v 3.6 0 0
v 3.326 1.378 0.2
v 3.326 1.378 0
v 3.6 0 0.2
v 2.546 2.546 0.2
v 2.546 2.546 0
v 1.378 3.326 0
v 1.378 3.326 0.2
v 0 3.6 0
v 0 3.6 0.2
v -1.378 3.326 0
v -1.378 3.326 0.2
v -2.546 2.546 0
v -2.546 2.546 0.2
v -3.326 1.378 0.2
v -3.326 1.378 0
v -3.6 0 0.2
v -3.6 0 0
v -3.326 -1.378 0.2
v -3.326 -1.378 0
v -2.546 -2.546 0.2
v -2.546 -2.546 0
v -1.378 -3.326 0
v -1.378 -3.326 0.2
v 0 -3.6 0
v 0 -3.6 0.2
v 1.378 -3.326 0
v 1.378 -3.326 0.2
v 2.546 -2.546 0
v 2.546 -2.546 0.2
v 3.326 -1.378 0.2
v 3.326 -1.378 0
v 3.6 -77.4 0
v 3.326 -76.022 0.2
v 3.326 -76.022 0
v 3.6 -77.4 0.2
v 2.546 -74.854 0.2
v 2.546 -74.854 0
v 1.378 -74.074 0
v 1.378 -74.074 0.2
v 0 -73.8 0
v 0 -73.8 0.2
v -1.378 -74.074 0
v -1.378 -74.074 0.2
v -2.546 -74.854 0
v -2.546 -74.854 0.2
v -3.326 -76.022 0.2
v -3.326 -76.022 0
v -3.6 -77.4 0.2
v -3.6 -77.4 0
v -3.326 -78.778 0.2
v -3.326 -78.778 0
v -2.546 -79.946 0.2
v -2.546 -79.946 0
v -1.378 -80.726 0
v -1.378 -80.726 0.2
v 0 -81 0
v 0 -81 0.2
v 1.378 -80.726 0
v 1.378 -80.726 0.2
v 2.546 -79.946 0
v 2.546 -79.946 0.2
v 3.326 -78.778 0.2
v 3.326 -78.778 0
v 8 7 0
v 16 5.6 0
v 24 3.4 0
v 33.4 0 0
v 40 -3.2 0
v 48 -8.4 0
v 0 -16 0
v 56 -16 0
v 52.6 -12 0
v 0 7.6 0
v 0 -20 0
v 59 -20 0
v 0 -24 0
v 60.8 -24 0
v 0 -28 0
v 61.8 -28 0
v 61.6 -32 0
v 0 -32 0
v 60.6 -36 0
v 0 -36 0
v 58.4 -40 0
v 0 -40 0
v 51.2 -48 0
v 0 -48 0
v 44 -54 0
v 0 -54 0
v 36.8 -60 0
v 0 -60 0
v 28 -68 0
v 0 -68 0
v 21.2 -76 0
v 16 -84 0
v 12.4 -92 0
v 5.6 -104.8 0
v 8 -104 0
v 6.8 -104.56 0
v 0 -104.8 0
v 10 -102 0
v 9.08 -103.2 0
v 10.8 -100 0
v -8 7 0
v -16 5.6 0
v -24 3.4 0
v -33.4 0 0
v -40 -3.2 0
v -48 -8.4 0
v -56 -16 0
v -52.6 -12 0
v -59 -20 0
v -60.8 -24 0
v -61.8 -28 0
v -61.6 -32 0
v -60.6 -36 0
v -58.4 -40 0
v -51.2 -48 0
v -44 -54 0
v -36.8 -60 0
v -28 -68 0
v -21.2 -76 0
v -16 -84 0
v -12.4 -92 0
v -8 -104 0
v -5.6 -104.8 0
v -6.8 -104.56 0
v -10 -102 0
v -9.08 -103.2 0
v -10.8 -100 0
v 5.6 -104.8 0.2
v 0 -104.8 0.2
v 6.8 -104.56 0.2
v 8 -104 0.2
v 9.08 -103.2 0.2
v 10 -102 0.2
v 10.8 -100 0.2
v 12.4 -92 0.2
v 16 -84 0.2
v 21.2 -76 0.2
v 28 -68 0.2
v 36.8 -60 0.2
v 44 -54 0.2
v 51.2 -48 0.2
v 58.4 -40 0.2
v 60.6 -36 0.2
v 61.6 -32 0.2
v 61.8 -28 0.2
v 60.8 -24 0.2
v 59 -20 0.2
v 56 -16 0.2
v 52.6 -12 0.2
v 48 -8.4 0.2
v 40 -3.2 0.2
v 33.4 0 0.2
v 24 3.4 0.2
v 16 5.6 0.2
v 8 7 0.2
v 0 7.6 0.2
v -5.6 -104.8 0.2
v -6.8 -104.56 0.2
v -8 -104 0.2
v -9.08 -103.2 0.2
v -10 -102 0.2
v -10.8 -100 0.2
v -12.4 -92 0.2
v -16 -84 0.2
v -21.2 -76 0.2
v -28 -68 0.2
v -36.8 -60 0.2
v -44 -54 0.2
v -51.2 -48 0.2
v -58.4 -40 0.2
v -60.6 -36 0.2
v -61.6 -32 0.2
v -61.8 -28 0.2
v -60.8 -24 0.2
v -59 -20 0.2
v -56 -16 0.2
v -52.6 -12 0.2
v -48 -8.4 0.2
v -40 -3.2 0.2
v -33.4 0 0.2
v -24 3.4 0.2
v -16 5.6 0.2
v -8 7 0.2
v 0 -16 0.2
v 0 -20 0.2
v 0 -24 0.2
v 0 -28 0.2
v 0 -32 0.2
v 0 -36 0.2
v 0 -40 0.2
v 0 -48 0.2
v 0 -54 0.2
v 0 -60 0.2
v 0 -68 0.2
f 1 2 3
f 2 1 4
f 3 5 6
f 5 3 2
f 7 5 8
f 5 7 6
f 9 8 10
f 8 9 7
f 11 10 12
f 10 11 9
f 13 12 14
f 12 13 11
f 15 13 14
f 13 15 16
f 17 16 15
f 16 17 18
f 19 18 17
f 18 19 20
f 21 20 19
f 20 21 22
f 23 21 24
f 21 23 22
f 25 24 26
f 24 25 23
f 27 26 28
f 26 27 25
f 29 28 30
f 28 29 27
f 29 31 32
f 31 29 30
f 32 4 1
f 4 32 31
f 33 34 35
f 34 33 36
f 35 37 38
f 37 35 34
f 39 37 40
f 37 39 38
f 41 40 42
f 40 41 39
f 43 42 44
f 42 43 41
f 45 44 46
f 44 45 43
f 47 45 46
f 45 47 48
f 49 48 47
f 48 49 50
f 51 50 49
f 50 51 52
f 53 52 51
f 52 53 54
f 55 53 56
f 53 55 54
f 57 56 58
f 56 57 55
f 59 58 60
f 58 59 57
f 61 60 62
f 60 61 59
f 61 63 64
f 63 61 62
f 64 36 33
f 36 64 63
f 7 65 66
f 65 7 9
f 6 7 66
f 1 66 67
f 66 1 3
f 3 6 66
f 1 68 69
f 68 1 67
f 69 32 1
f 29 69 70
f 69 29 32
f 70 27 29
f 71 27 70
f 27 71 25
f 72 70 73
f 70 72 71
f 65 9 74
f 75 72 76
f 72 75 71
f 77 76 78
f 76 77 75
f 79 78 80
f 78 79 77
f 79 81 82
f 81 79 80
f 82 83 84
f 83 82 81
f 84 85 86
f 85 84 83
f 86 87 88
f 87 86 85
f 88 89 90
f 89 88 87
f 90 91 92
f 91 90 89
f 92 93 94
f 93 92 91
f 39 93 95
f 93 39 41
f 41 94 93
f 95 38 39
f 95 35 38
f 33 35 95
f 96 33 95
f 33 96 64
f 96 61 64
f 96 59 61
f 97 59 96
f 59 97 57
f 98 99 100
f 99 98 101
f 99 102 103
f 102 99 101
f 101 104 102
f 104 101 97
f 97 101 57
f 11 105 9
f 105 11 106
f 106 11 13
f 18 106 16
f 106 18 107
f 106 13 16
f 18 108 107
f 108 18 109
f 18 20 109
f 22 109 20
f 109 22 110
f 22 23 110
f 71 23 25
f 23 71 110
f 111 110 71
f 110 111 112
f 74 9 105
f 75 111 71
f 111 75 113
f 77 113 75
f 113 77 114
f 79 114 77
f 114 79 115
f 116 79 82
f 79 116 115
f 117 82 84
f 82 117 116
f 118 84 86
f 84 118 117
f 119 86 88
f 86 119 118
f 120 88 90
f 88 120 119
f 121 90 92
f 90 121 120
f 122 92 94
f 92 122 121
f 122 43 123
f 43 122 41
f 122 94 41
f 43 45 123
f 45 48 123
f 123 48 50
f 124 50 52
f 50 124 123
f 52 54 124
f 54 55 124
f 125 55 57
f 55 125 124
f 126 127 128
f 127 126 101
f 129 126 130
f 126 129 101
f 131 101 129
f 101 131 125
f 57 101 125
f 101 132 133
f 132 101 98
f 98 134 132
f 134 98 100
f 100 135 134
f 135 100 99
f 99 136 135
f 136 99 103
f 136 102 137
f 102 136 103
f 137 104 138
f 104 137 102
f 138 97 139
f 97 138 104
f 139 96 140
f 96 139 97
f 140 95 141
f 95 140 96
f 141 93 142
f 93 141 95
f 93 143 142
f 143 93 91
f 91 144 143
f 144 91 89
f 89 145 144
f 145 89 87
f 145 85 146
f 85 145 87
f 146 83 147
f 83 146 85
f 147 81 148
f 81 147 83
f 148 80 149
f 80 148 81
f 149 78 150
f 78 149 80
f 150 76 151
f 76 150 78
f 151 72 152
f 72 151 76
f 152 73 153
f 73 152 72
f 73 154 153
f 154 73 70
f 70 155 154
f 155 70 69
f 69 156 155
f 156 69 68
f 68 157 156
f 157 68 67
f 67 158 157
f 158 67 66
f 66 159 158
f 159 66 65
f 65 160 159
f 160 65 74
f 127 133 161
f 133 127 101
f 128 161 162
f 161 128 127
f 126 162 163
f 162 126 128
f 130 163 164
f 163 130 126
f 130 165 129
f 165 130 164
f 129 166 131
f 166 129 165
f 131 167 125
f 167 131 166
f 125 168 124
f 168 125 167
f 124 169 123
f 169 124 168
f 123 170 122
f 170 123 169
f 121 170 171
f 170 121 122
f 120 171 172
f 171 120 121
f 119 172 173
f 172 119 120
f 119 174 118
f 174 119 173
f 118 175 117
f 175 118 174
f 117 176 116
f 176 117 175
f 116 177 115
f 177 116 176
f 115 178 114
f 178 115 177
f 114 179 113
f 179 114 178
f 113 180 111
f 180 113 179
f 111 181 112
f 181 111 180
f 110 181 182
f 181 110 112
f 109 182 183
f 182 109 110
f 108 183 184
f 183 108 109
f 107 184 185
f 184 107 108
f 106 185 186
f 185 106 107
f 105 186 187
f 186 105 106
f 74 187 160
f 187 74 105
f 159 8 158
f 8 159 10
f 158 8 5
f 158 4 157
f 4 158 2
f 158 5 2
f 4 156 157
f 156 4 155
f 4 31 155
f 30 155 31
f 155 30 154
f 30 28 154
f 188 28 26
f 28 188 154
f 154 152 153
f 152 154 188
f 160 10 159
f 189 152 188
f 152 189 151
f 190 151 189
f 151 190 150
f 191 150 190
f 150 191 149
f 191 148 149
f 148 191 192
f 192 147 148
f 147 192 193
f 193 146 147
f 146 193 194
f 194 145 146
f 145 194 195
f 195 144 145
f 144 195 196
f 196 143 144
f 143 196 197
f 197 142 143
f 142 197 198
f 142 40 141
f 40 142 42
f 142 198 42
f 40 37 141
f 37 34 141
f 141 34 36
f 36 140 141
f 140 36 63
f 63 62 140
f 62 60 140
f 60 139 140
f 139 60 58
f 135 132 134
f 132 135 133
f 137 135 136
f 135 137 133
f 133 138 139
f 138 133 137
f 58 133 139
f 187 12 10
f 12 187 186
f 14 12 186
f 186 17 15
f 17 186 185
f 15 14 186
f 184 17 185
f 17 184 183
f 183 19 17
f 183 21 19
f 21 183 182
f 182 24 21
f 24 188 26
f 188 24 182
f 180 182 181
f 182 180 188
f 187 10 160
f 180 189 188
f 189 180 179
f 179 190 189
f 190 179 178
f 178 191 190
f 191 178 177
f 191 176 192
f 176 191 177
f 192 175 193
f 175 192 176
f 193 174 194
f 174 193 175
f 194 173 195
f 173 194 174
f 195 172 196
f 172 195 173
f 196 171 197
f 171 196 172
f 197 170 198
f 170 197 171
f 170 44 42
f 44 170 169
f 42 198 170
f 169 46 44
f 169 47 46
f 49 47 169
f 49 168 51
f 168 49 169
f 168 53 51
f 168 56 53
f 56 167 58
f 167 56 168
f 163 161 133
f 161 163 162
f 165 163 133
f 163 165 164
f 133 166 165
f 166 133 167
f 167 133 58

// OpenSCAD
// file: ../p/2-4edge.scad
use <../lib.scad>
function ldraw_lib__2_4edge() = [
// 0 Circle 0.5
// 0 Name: 2-4edge.dat
// 0 Author: James Jessiman
// 0 !LDRAW_ORG Primitive UPDATE 2017-01
// 0 !LICENSE Licensed under CC BY 2.0 and CC BY 4.0 : see CAreadme.txt
// 
// 0 BFC CERTIFY CCW
  [0,"BFC","CERTIFY"],
  [0,"BFC","CCW"],
// 
// 0 !HISTORY 2007-06-24 [PTadmin] Header formatted for Contributor Agreement
// 0 !HISTORY 2008-07-01 [PTadmin] Official Update 2008-01
// 0 !HISTORY 2017-01-15 [Steffen] BFCed
// 0 !HISTORY 2017-12-30 [PTadmin] Official Update 2017-01
// 
// 
// 2 24 1 0 0 0.9239 0 0.3827
  [2,24,1,0,0,0.9239,0,0.3827],
// 2 24 0.9239 0 0.3827 0.7071 0 0.7071
  [2,24,0.9239,0,0.3827,0.7071,0,0.7071],
// 2 24 0.7071 0 0.7071 0.3827 0 0.9239
  [2,24,0.7071,0,0.7071,0.3827,0,0.9239],
// 2 24 0.3827 0 0.9239 0 0 1
  [2,24,0.3827,0,0.9239,0,0,1],
// 2 24 0 0 1 -0.3827 0 0.9239
  [2,24,0,0,1,-0.3827,0,0.9239],
// 2 24 -0.3827 0 0.9239 -0.7071 0 0.7071
  [2,24,-0.3827,0,0.9239,-0.7071,0,0.7071],
// 2 24 -0.7071 0 0.7071 -0.9239 0 0.3827
  [2,24,-0.7071,0,0.7071,-0.9239,0,0.3827],
// 2 24 -0.9239 0 0.3827 -1 0 0
  [2,24,-0.9239,0,0.3827,-1,0,0],
];
module ldraw_lib__2_4edge(step=0, col=false, unit=2/5, alt=false, line=0.2, solid=!$preview)
    makepoly(ldraw_lib__2_4edge(), step=step, col=col, unit=unit, alt=alt, line=line, solid=solid);
ldraw_lib__2_4edge(line=0.2);
// file: s/93668s02.scad
use <../../lib.scad>
function ldraw_lib__s__93668s02() = [
// 0 ~Sheet Plastic 15 x 14 Curved - Half Edge
// 0 Name: s\93668s02.dat
// 0 Author: Christian Neumann [Wesley]
// 0 !LDRAW_ORG Subpart UPDATE 2018-02
// 0 !LICENSE Licensed under CC BY 2.0 and CC BY 4.0 : see CAreadme.txt
// 
// 0 BFC CERTIFY CCW
  [0,"BFC","CERTIFY"],
  [0,"BFC","CCW"],
// 
// 0 !HISTORY 2018-12-08 [PTadmin] Official Update 2018-02
// 
// 
// 4 16 0 0 -262 14 0 -262 14 -0.5 -262 0 -0.5 -262
  [4,16,0,0,-262,14,0,-262,14,-0.5,-262,0,-0.5,-262],
// 4 16 14 0 -262 17 0 -261.4 17 -0.5 -261.4 14 -0.5 -262
  [4,16,14,0,-262,17,0,-261.4,17,-0.5,-261.4,14,-0.5,-262],
// 4 16 17 0 -261.4 20 0 -260 20 -0.5 -260 17 -0.5 -261.4
  [4,16,17,0,-261.4,20,0,-260,20,-0.5,-260,17,-0.5,-261.4],
// 4 16 20 0 -260 22.7 0 -258 22.7 -0.5 -258 20 -0.5 -260
  [4,16,20,0,-260,22.7,0,-258,22.7,-0.5,-258,20,-0.5,-260],
// 4 16 22.7 0 -258 25 0 -255 25 -0.5 -255 22.7 -0.5 -258
  [4,16,22.7,0,-258,25,0,-255,25,-0.5,-255,22.7,-0.5,-258],
// 4 16 25 0 -255 27 0 -250 27 -0.5 -250 25 -0.5 -255
  [4,16,25,0,-255,27,0,-250,27,-0.5,-250,25,-0.5,-255],
// 4 16 27 0 -250 31 0 -230 31 -0.5 -230 27 -0.5 -250
  [4,16,27,0,-250,31,0,-230,31,-0.5,-230,27,-0.5,-250],
// 4 16 31 0 -230 40 0 -210 40 -0.5 -210 31 -0.5 -230
  [4,16,31,0,-230,40,0,-210,40,-0.5,-210,31,-0.5,-230],
// 4 16 40 0 -210 53 0 -190 53 -0.5 -190 40 -0.5 -210
  [4,16,40,0,-210,53,0,-190,53,-0.5,-190,40,-0.5,-210],
// 4 16 53 0 -190 70 0 -170 70 -0.5 -170 53 -0.5 -190
  [4,16,53,0,-190,70,0,-170,70,-0.5,-170,53,-0.5,-190],
// 4 16 70 0 -170 92 0 -150 92 -0.5 -150 70 -0.5 -170
  [4,16,70,0,-170,92,0,-150,92,-0.5,-150,70,-0.5,-170],
// 4 16 92 0 -150 110 0 -135 110 -0.5 -135 92 -0.5 -150
  [4,16,92,0,-150,110,0,-135,110,-0.5,-135,92,-0.5,-150],
// 4 16 110 0 -135 128 0 -120 128 -0.5 -120 110 -0.5 -135
  [4,16,110,0,-135,128,0,-120,128,-0.5,-120,110,-0.5,-135],
// 4 16 128 0 -120 146 0 -100 146 -0.5 -100 128 -0.5 -120
  [4,16,128,0,-120,146,0,-100,146,-0.5,-100,128,-0.5,-120],
// 4 16 146 0 -100 151.5 0 -90 151.5 -0.5 -90 146 -0.5 -100
  [4,16,146,0,-100,151.5,0,-90,151.5,-0.5,-90,146,-0.5,-100],
// 4 16 151.5 0 -90 154 0 -80 154 -0.5 -80 151.5 -0.5 -90
  [4,16,151.5,0,-90,154,0,-80,154,-0.5,-80,151.5,-0.5,-90],
// 4 16 154 0 -80 154.5 0 -70 154.5 -0.5 -70 154 -0.5 -80
  [4,16,154,0,-80,154.5,0,-70,154.5,-0.5,-70,154,-0.5,-80],
// 4 16 154.5 0 -70 152 0 -60 152 -0.5 -60 154.5 -0.5 -70
  [4,16,154.5,0,-70,152,0,-60,152,-0.5,-60,154.5,-0.5,-70],
// 4 16 152 0 -60 147.5 0 -50 147.5 -0.5 -50 152 -0.5 -60
  [4,16,152,0,-60,147.5,0,-50,147.5,-0.5,-50,152,-0.5,-60],
// 4 16 147.5 0 -50 140 0 -40 140 -0.5 -40 147.5 -0.5 -50
  [4,16,147.5,0,-50,140,0,-40,140,-0.5,-40,147.5,-0.5,-50],
// 4 16 140 0 -40 131.5 0 -30 131.5 -0.5 -30 140 -0.5 -40
  [4,16,140,0,-40,131.5,0,-30,131.5,-0.5,-30,140,-0.5,-40],
// 4 16 131.5 0 -30 120 0 -21 120 -0.5 -21 131.5 -0.5 -30
  [4,16,131.5,0,-30,120,0,-21,120,-0.5,-21,131.5,-0.5,-30],
// 4 16 120 0 -21 100 0 -8 100 -0.5 -8 120 -0.5 -21
  [4,16,120,0,-21,100,0,-8,100,-0.5,-8,120,-0.5,-21],
// 4 16 100 0 -8 83.5 0 0 83.5 -0.5 0 100 -0.5 -8
  [4,16,100,0,-8,83.5,0,0,83.5,-0.5,0,100,-0.5,-8],
// 4 16 83.5 0 0 60 0 8.5 60 -0.5 8.5 83.5 -0.5 0
  [4,16,83.5,0,0,60,0,8.5,60,-0.5,8.5,83.5,-0.5,0],
// 4 16 60 0 8.5 40 0 14 40 -0.5 14 60 -0.5 8.5
  [4,16,60,0,8.5,40,0,14,40,-0.5,14,60,-0.5,8.5],
// 4 16 40 0 14 20 0 17.5 20 -0.5 17.5 40 -0.5 14
  [4,16,40,0,14,20,0,17.5,20,-0.5,17.5,40,-0.5,14],
// 4 16 20 0 17.5 0 0 19 0 -0.5 19 20 -0.5 17.5
  [4,16,20,0,17.5,0,0,19,0,-0.5,19,20,-0.5,17.5],
// 5 24 14 0 -262 14 -0.5 -262 17 0 -261.4 0 0 -262
  [5,24,14,0,-262,14,-0.5,-262,17,0,-261.4,0,0,-262],
// 5 24 17 0 -261.4 17 -0.5 -261.4 20 0 -260 14 0 -262
  [5,24,17,0,-261.4,17,-0.5,-261.4,20,0,-260,14,0,-262],
// 5 24 20 0 -260 20 -0.5 -260 22.7 0 -258 17 0 -261.4
  [5,24,20,0,-260,20,-0.5,-260,22.7,0,-258,17,0,-261.4],
// 5 24 22.7 0 -258 22.7 -0.5 -258 25 0 -255 20 0 -260
  [5,24,22.7,0,-258,22.7,-0.5,-258,25,0,-255,20,0,-260],
// 5 24 25 0 -255 25 -0.5 -255 27 0 -250 22.7 0 -258
  [5,24,25,0,-255,25,-0.5,-255,27,0,-250,22.7,0,-258],
// 5 24 27 0 -250 27 -0.5 -250 31 0 -230 25 0 -255
  [5,24,27,0,-250,27,-0.5,-250,31,0,-230,25,0,-255],
// 5 24 31 0 -230 31 -0.5 -230 40 0 -210 27 0 -250
  [5,24,31,0,-230,31,-0.5,-230,40,0,-210,27,0,-250],
// 5 24 40 0 -210 40 -0.5 -210 53 0 -190 31 0 -230
  [5,24,40,0,-210,40,-0.5,-210,53,0,-190,31,0,-230],
// 5 24 53 0 -190 53 -0.5 -190 70 0 -170 40 0 -210
  [5,24,53,0,-190,53,-0.5,-190,70,0,-170,40,0,-210],
// 5 24 70 0 -170 70 -0.5 -170 92 0 -150 53 0 -190
  [5,24,70,0,-170,70,-0.5,-170,92,0,-150,53,0,-190],
// 5 24 92 0 -150 92 -0.5 -150 110 0 -135 70 0 -170
  [5,24,92,0,-150,92,-0.5,-150,110,0,-135,70,0,-170],
// 5 24 110 0 -135 110 -0.5 -135 128 0 -120 92 0 -150
  [5,24,110,0,-135,110,-0.5,-135,128,0,-120,92,0,-150],
// 5 24 128 0 -120 128 -0.5 -120 146 0 -100 110 0 -135
  [5,24,128,0,-120,128,-0.5,-120,146,0,-100,110,0,-135],
// 5 24 146 0 -100 146 -0.5 -100 151.5 0 -90 128 0 -120
  [5,24,146,0,-100,146,-0.5,-100,151.5,0,-90,128,0,-120],
// 5 24 151.5 0 -90 151.5 -0.5 -90 154 0 -80 146 0 -100
  [5,24,151.5,0,-90,151.5,-0.5,-90,154,0,-80,146,0,-100],
// 5 24 154 0 -80 154 -0.5 -80 154.5 0 -70 151.5 0 -90
  [5,24,154,0,-80,154,-0.5,-80,154.5,0,-70,151.5,0,-90],
// 5 24 154.5 0 -70 154.5 -0.5 -70 152 0 -60 154 0 -80
  [5,24,154.5,0,-70,154.5,-0.5,-70,152,0,-60,154,0,-80],
// 5 24 152 0 -60 152 -0.5 -60 147.5 0 -50 154.5 0 -70
  [5,24,152,0,-60,152,-0.5,-60,147.5,0,-50,154.5,0,-70],
// 5 24 147.5 0 -50 147.5 -0.5 -50 140 0 -40 152 0 -60
  [5,24,147.5,0,-50,147.5,-0.5,-50,140,0,-40,152,0,-60],
// 5 24 140 0 -40 140 -0.5 -40 131.5 0 -30 147.5 0 -50
  [5,24,140,0,-40,140,-0.5,-40,131.5,0,-30,147.5,0,-50],
// 5 24 131.5 0 -30 131.5 -0.5 -30 120 0 -21 140 0 -40
  [5,24,131.5,0,-30,131.5,-0.5,-30,120,0,-21,140,0,-40],
// 5 24 120 0 -21 120 -0.5 -21 100 0 -8 131.5 0 -30
  [5,24,120,0,-21,120,-0.5,-21,100,0,-8,131.5,0,-30],
// 5 24 100 0 -8 100 -0.5 -8 83.5 0 0 120 0 -21
  [5,24,100,0,-8,100,-0.5,-8,83.5,0,0,120,0,-21],
// 5 24 83.5 0 0 83.5 -0.5 0 60 0 8.5 100 0 -8
  [5,24,83.5,0,0,83.5,-0.5,0,60,0,8.5,100,0,-8],
// 5 24 60 0 8.5 60 -0.5 8.5 40 0 14 83.5 0 0
  [5,24,60,0,8.5,60,-0.5,8.5,40,0,14,83.5,0,0],
// 5 24 40 0 14 40 -0.5 14 20 0 17.5 60 0 8.5
  [5,24,40,0,14,40,-0.5,14,20,0,17.5,60,0,8.5],
// 5 24 20 0 17.5 20 -0.5 17.5 0 0 19 40 0 14
  [5,24,20,0,17.5,20,-0.5,17.5,0,0,19,40,0,14],
];
module ldraw_lib__s__93668s02(step=0, col=false, unit=2/5, alt=false, line=0.2, solid=!$preview)
    makepoly(ldraw_lib__s__93668s02(), step=step, col=col, unit=unit, alt=alt, line=line, solid=solid);
ldraw_lib__s__93668s02(line=0.2);
// file: s/93668s01.scad
use <../../lib.scad>
use <../../p/2-4edge.scad>
function ldraw_lib__s__93668s01() = [
// 0 ~Sheet Plastic 15 x 14 Curved - Half Surface
// 0 Name: s\93668s01.dat
// 0 Author: Christian Neumann [Wesley]
// 0 !LDRAW_ORG Subpart UPDATE 2018-02
// 0 !LICENSE Licensed under CC BY 2.0 and CC BY 4.0 : see CAreadme.txt
// 
// 0 BFC CERTIFY CCW
  [0,"BFC","CERTIFY"],
  [0,"BFC","CCW"],
// 
// 0 !HISTORY 2018-12-08 [PTadmin] Official Update 2018-02
// 
// 
// 1 16 0 0 0 0 0 9 0 1 0 -9 0 0 2-4edge.dat
  [1,16,0,0,0,0,0,9,0,1,0,-9,0,0, ldraw_lib__2_4edge()],
// 1 24 0 0 -193.5 0 0 9 0 1 0 -9 0 0 2-4edge.dat
  [1,24,0,0,-193.5,0,0,9,0,1,0,-9,0,0, ldraw_lib__2_4edge()],
// 4 16 0 0 9 3.4443 0 8.3151 40 0 14 20 0 17.5
  [4,16,0,0,9,3.4443,0,8.3151,40,0,14,20,0,17.5],
// 3 16 40 0 14 3.4443 0 8.3151 6.3639 0 6.3639
  [3,16,40,0,14,3.4443,0,8.3151,6.3639,0,6.3639],
// 4 16 40 0 14 8.3151 0 3.4443 9 0 0 60 0 8.5
  [4,16,40,0,14,8.3151,0,3.4443,9,0,0,60,0,8.5],
// 3 16 40 0 14 6.3639 0 6.3639 8.3151 0 3.4443
  [3,16,40,0,14,6.3639,0,6.3639,8.3151,0,3.4443],
// 4 16 83.5 0 0 60 0 8.5 9 0 0 100 0 -8
  [4,16,83.5,0,0,60,0,8.5,9,0,0,100,0,-8],
// 3 16 9 0 0 8.3151 0 -3.4443 100 0 -8
  [3,16,9,0,0,8.3151,0,-3.4443,100,0,-8],
// 4 16 100 0 -8 8.3151 0 -3.4443 6.3639 0 -6.3639 120 0 -21
  [4,16,100,0,-8,8.3151,0,-3.4443,6.3639,0,-6.3639,120,0,-21],
// 3 16 6.3639 0 -6.3639 3.4443 0 -8.3151 120 0 -21
  [3,16,6.3639,0,-6.3639,3.4443,0,-8.3151,120,0,-21],
// 4 16 120 0 -21 3.4443 0 -8.3151 0 0 -9 0 0 -40
  [4,16,120,0,-21,3.4443,0,-8.3151,0,0,-9,0,0,-40],
// 4 16 0 0 -40 140 0 -40 131.5 0 -30 120 0 -21
  [4,16,0,0,-40,140,0,-40,131.5,0,-30,120,0,-21],
// 3 16 0 0 19 0 0 9 20 0 17.5
  [3,16,0,0,19,0,0,9,20,0,17.5],
// 4 16 0 0 -50 147.5 0 -50 140 0 -40 0 0 -40
  [4,16,0,0,-50,147.5,0,-50,140,0,-40,0,0,-40],
// 4 16 0 0 -60 152 0 -60 147.5 0 -50 0 0 -50
  [4,16,0,0,-60,152,0,-60,147.5,0,-50,0,0,-50],
// 4 16 0 0 -70 154.5 0 -70 152 0 -60 0 0 -60
  [4,16,0,0,-70,154.5,0,-70,152,0,-60,0,0,-60],
// 4 16 0 0 -80 154 0 -80 154.5 0 -70 0 0 -70
  [4,16,0,0,-80,154,0,-80,154.5,0,-70,0,0,-70],
// 4 16 0 0 -90 151.5 0 -90 154 0 -80 0 0 -80
  [4,16,0,0,-90,151.5,0,-90,154,0,-80,0,0,-80],
// 4 16 0 0 -100 146 0 -100 151.5 0 -90 0 0 -90
  [4,16,0,0,-100,146,0,-100,151.5,0,-90,0,0,-90],
// 4 16 0 0 -120 128 0 -120 146 0 -100 0 0 -100
  [4,16,0,0,-120,128,0,-120,146,0,-100,0,0,-100],
// 4 16 0 0 -135 110 0 -135 128 0 -120 0 0 -120
  [4,16,0,0,-135,110,0,-135,128,0,-120,0,0,-120],
// 4 16 0 0 -150 92 0 -150 110 0 -135 0 0 -135
  [4,16,0,0,-150,92,0,-150,110,0,-135,0,0,-135],
// 4 16 0 0 -170 70 0 -170 92 0 -150 0 0 -150
  [4,16,0,0,-170,70,0,-170,92,0,-150,0,0,-150],
// 4 16 3.4443 0 -185.185 53 0 -190 70 0 -170 0 0 -184.5
  [4,16,3.4443,0,-185.185,53,0,-190,70,0,-170,0,0,-184.5],
// 3 16 70 0 -170 0 0 -170 0 0 -184.5
  [3,16,70,0,-170,0,0,-170,0,0,-184.5],
// 3 16 3.4443 0 -185.185 6.3639 0 -187.136 53 0 -190
  [3,16,3.4443,0,-185.185,6.3639,0,-187.136,53,0,-190],
// 3 16 6.3639 0 -187.136 8.3151 0 -190.056 53 0 -190
  [3,16,6.3639,0,-187.136,8.3151,0,-190.056,53,0,-190],
// 3 16 53 0 -190 8.3151 0 -190.056 9 0 -193.5
  [3,16,53,0,-190,8.3151,0,-190.056,9,0,-193.5],
// 4 16 53 0 -190 9 0 -193.5 8.3151 0 -196.944 40 0 -210
  [4,16,53,0,-190,9,0,-193.5,8.3151,0,-196.944,40,0,-210],
// 3 16 8.3151 0 -196.944 6.3639 0 -199.864 40 0 -210
  [3,16,8.3151,0,-196.944,6.3639,0,-199.864,40,0,-210],
// 3 16 6.3639 0 -199.864 3.4443 0 -201.815 40 0 -210
  [3,16,6.3639,0,-199.864,3.4443,0,-201.815,40,0,-210],
// 4 16 40 0 -210 3.4443 0 -201.815 0 0 -202.5 31 0 -230
  [4,16,40,0,-210,3.4443,0,-201.815,0,0,-202.5,31,0,-230],
// 4 16 0 0 -262 14 0 -262 17 0 -261.4 20 0 -260
  [4,16,0,0,-262,14,0,-262,17,0,-261.4,20,0,-260],
// 4 16 0 0 -262 20 0 -260 22.7 0 -258 25 0 -255
  [4,16,0,0,-262,20,0,-260,22.7,0,-258,25,0,-255],
// 4 16 0 0 -262 25 0 -255 27 0 -250 31 0 -230
  [4,16,0,0,-262,25,0,-255,27,0,-250,31,0,-230],
// 3 16 0 0 -202.5 0 0 -262 31 0 -230
  [3,16,0,0,-202.5,0,0,-262,31,0,-230],
// 2 24 40 0 14 20 0 17.5
  [2,24,40,0,14,20,0,17.5],
// 2 24 60 0 8.5 40 0 14
  [2,24,60,0,8.5,40,0,14],
// 2 24 83.5 0 0 60 0 8.5
  [2,24,83.5,0,0,60,0,8.5],
// 2 24 100 0 -8 83.5 0 0
  [2,24,100,0,-8,83.5,0,0],
// 2 24 120 0 -21 100 0 -8
  [2,24,120,0,-21,100,0,-8],
// 2 24 140 0 -40 131.5 0 -30
  [2,24,140,0,-40,131.5,0,-30],
// 2 24 131.5 0 -30 120 0 -21
  [2,24,131.5,0,-30,120,0,-21],
// 2 24 20 0 17.5 0 0 19
  [2,24,20,0,17.5,0,0,19],
// 2 24 147.5 0 -50 140 0 -40
  [2,24,147.5,0,-50,140,0,-40],
// 2 24 152 0 -60 147.5 0 -50
  [2,24,152,0,-60,147.5,0,-50],
// 2 24 154.5 0 -70 152 0 -60
  [2,24,154.5,0,-70,152,0,-60],
// 2 24 154 0 -80 154.5 0 -70
  [2,24,154,0,-80,154.5,0,-70],
// 2 24 151.5 0 -90 154 0 -80
  [2,24,151.5,0,-90,154,0,-80],
// 2 24 146 0 -100 151.5 0 -90
  [2,24,146,0,-100,151.5,0,-90],
// 2 24 128 0 -120 146 0 -100
  [2,24,128,0,-120,146,0,-100],
// 2 24 110 0 -135 128 0 -120
  [2,24,110,0,-135,128,0,-120],
// 2 24 92 0 -150 110 0 -135
  [2,24,92,0,-150,110,0,-135],
// 2 24 70 0 -170 92 0 -150
  [2,24,70,0,-170,92,0,-150],
// 2 24 53 0 -190 70 0 -170
  [2,24,53,0,-190,70,0,-170],
// 2 24 40 0 -210 53 0 -190
  [2,24,40,0,-210,53,0,-190],
// 2 24 31 0 -230 40 0 -210
  [2,24,31,0,-230,40,0,-210],
// 2 24 0 0 -262 14 0 -262
  [2,24,0,0,-262,14,0,-262],
// 2 24 14 0 -262 17 0 -261.4
  [2,24,14,0,-262,17,0,-261.4],
// 2 24 17 0 -261.4 20 0 -260
  [2,24,17,0,-261.4,20,0,-260],
// 2 24 20 0 -260 22.7 0 -258
  [2,24,20,0,-260,22.7,0,-258],
// 2 24 22.7 0 -258 25 0 -255
  [2,24,22.7,0,-258,25,0,-255],
// 2 24 25 0 -255 27 0 -250
  [2,24,25,0,-255,27,0,-250],
// 2 24 27 0 -250 31 0 -230
  [2,24,27,0,-250,31,0,-230],
];
module ldraw_lib__s__93668s01(step=0, col=false, unit=2/5, alt=false, line=0.2, solid=!$preview)
    makepoly(ldraw_lib__s__93668s01(), step=step, col=col, unit=unit, alt=alt, line=line, solid=solid);
ldraw_lib__s__93668s01(line=0.2);
// file: ../p/4-4cyli.scad
use <../lib.scad>
function ldraw_lib__4_4cyli() = [
// 0 Cylinder 1.0
// 0 Name: 4-4cyli.dat
// 0 Author: James Jessiman
// 0 !LDRAW_ORG Primitive UPDATE 2005-01
// 0 !LICENSE Licensed under CC BY 2.0 and CC BY 4.0 : see CAreadme.txt
// 
// 0 BFC CERTIFY CCW
  [0,"BFC","CERTIFY"],
  [0,"BFC","CCW"],
// 
// 0 !HISTORY 1998-12-15 [PTadmin] Official Update 1998-10
// 0 !HISTORY 2002-03-23 [sbliss] Added BFC statement; merged headers from files in distributions LDraw 0.27 and Complete.
// 0 !HISTORY 2002-04-25 [PTadmin] Official Update 2002-02
// 0 !HISTORY 2004-12-14 [guyvivan] BFC CCW
// 0 !HISTORY 2005-12-28 [PTadmin] Official Update 2005-01
// 0 !HISTORY 2007-06-24 [PTadmin] Header formatted for Contributor Agreement
// 0 !HISTORY 2008-07-01 [PTadmin] Official Update 2008-01
// 
// 
// 4 16 1 1 0 0.9239 1 0.3827 0.9239 0 0.3827 1 0 0
  [4,16,1,1,0,0.9239,1,0.3827,0.9239,0,0.3827,1,0,0],
// 5 24 1 0 0 1 1 0 0.9239 0 0.3827 0.9239 0 -0.3827
  [5,24,1,0,0,1,1,0,0.9239,0,0.3827,0.9239,0,-0.3827],
// 4 16 0.9239 1 0.3827 0.7071 1 0.7071 0.7071 0 0.7071 0.9239 0 0.3827
  [4,16,0.9239,1,0.3827,0.7071,1,0.7071,0.7071,0,0.7071,0.9239,0,0.3827],
// 5 24 0.9239 0 0.3827 0.9239 1 0.3827 0.7071 0 0.7071 1 0 0
  [5,24,0.9239,0,0.3827,0.9239,1,0.3827,0.7071,0,0.7071,1,0,0],
// 4 16 0.7071 1 0.7071 0.3827 1 0.9239 0.3827 0 0.9239 0.7071 0 0.7071
  [4,16,0.7071,1,0.7071,0.3827,1,0.9239,0.3827,0,0.9239,0.7071,0,0.7071],
// 5 24 0.7071 0 0.7071 0.7071 1 0.7071 0.3827 0 0.9239 0.9239 0 0.3827
  [5,24,0.7071,0,0.7071,0.7071,1,0.7071,0.3827,0,0.9239,0.9239,0,0.3827],
// 4 16 0.3827 1 0.9239 0 1 1 0 0 1 0.3827 0 0.9239
  [4,16,0.3827,1,0.9239,0,1,1,0,0,1,0.3827,0,0.9239],
// 5 24 0.3827 0 0.9239 0.3827 1 0.9239 0 0 1 0.7071 0 0.7071
  [5,24,0.3827,0,0.9239,0.3827,1,0.9239,0,0,1,0.7071,0,0.7071],
// 4 16 0 1 1 -0.3827 1 0.9239 -0.3827 0 0.9239 0 0 1
  [4,16,0,1,1,-0.3827,1,0.9239,-0.3827,0,0.9239,0,0,1],
// 5 24 0 0 1 0 1 1 -0.3827 0 0.9239 0.3827 0 0.9239
  [5,24,0,0,1,0,1,1,-0.3827,0,0.9239,0.3827,0,0.9239],
// 4 16 -0.3827 1 0.9239 -0.7071 1 0.7071 -0.7071 0 0.7071 -0.3827 0 0.9239
  [4,16,-0.3827,1,0.9239,-0.7071,1,0.7071,-0.7071,0,0.7071,-0.3827,0,0.9239],
// 5 24 -0.3827 0 0.9239 -0.3827 1 0.9239 -0.7071 0 0.7071 0 0 1
  [5,24,-0.3827,0,0.9239,-0.3827,1,0.9239,-0.7071,0,0.7071,0,0,1],
// 4 16 -0.7071 1 0.7071 -0.9239 1 0.3827 -0.9239 0 0.3827 -0.7071 0 0.7071
  [4,16,-0.7071,1,0.7071,-0.9239,1,0.3827,-0.9239,0,0.3827,-0.7071,0,0.7071],
// 5 24 -0.7071 0 0.7071 -0.7071 1 0.7071 -0.9239 0 0.3827 -0.3827 0 0.9239
  [5,24,-0.7071,0,0.7071,-0.7071,1,0.7071,-0.9239,0,0.3827,-0.3827,0,0.9239],
// 4 16 -0.9239 1 0.3827 -1 1 0 -1 0 0 -0.9239 0 0.3827
  [4,16,-0.9239,1,0.3827,-1,1,0,-1,0,0,-0.9239,0,0.3827],
// 5 24 -0.9239 0 0.3827 -0.9239 1 0.3827 -1 0 0 -0.7071 0 0.7071
  [5,24,-0.9239,0,0.3827,-0.9239,1,0.3827,-1,0,0,-0.7071,0,0.7071],
// 4 16 -1 1 0 -0.9239 1 -0.3827 -0.9239 0 -0.3827 -1 0 0
  [4,16,-1,1,0,-0.9239,1,-0.3827,-0.9239,0,-0.3827,-1,0,0],
// 5 24 -1 0 0 -1 1 0 -0.9239 0 -0.3827 -0.9239 0 0.3827
  [5,24,-1,0,0,-1,1,0,-0.9239,0,-0.3827,-0.9239,0,0.3827],
// 4 16 -0.9239 1 -0.3827 -0.7071 1 -0.7071 -0.7071 0 -0.7071 -0.9239 0 -0.3827
  [4,16,-0.9239,1,-0.3827,-0.7071,1,-0.7071,-0.7071,0,-0.7071,-0.9239,0,-0.3827],
// 5 24 -0.9239 0 -0.3827 -0.9239 1 -0.3827 -0.7071 0 -0.7071 -1 0 0
  [5,24,-0.9239,0,-0.3827,-0.9239,1,-0.3827,-0.7071,0,-0.7071,-1,0,0],
// 4 16 -0.7071 1 -0.7071 -0.3827 1 -0.9239 -0.3827 0 -0.9239 -0.7071 0 -0.7071
  [4,16,-0.7071,1,-0.7071,-0.3827,1,-0.9239,-0.3827,0,-0.9239,-0.7071,0,-0.7071],
// 5 24 -0.7071 0 -0.7071 -0.7071 1 -0.7071 -0.3827 0 -0.9239 -0.9239 0 -0.3827
  [5,24,-0.7071,0,-0.7071,-0.7071,1,-0.7071,-0.3827,0,-0.9239,-0.9239,0,-0.3827],
// 4 16 -0.3827 1 -0.9239 0 1 -1 0 0 -1 -0.3827 0 -0.9239
  [4,16,-0.3827,1,-0.9239,0,1,-1,0,0,-1,-0.3827,0,-0.9239],
// 5 24 -0.3827 0 -0.9239 -0.3827 1 -0.9239 0 0 -1 -0.7071 0 -0.7071
  [5,24,-0.3827,0,-0.9239,-0.3827,1,-0.9239,0,0,-1,-0.7071,0,-0.7071],
// 4 16 0 1 -1 0.3827 1 -0.9239 0.3827 0 -0.9239 0 0 -1
  [4,16,0,1,-1,0.3827,1,-0.9239,0.3827,0,-0.9239,0,0,-1],
// 5 24 0 0 -1 0 1 -1 0.3827 0 -0.9239 -0.3827 0 -0.9239
  [5,24,0,0,-1,0,1,-1,0.3827,0,-0.9239,-0.3827,0,-0.9239],
// 4 16 0.3827 1 -0.9239 0.7071 1 -0.7071 0.7071 0 -0.7071 0.3827 0 -0.9239
  [4,16,0.3827,1,-0.9239,0.7071,1,-0.7071,0.7071,0,-0.7071,0.3827,0,-0.9239],
// 5 24 0.3827 0 -0.9239 0.3827 1 -0.9239 0.7071 0 -0.7071 0 0 -1
  [5,24,0.3827,0,-0.9239,0.3827,1,-0.9239,0.7071,0,-0.7071,0,0,-1],
// 4 16 0.7071 1 -0.7071 0.9239 1 -0.3827 0.9239 0 -0.3827 0.7071 0 -0.7071
  [4,16,0.7071,1,-0.7071,0.9239,1,-0.3827,0.9239,0,-0.3827,0.7071,0,-0.7071],
// 5 24 0.7071 0 -0.7071 0.7071 1 -0.7071 0.9239 0 -0.3827 0.3827 0 -0.9239
  [5,24,0.7071,0,-0.7071,0.7071,1,-0.7071,0.9239,0,-0.3827,0.3827,0,-0.9239],
// 4 16 0.9239 1 -0.3827 1 1 0 1 0 0 0.9239 0 -0.3827
  [4,16,0.9239,1,-0.3827,1,1,0,1,0,0,0.9239,0,-0.3827],
// 5 24 0.9239 0 -0.3827 0.9239 1 -0.3827 1 0 0 0.7071 0 -0.7071
  [5,24,0.9239,0,-0.3827,0.9239,1,-0.3827,1,0,0,0.7071,0,-0.7071],
// 0
];
module ldraw_lib__4_4cyli(step=0, col=false, unit=2/5, alt=false, line=0.2, solid=!$preview)
    makepoly(ldraw_lib__4_4cyli(), step=step, col=col, unit=unit, alt=alt, line=line, solid=solid);
ldraw_lib__4_4cyli(line=0.2);
// main file
use <../lib.scad>
use <../p/4-4cyli.scad>
use <s/93668s01.scad>
use <s/93668s02.scad>
function ldraw_lib__93668() = [
// 0 Sheet Plastic 15 x 14 Curved
// 0 Name: 93668.dat
// 0 Author: Christian Neumann [Wesley]
// 0 !LDRAW_ORG Part UPDATE 2019-01
// 0 !LICENSE Licensed under CC BY 2.0 and CC BY 4.0 : see CAreadme.txt
// 
// 0 !HELP upper hole center at 0 0 0
// 0 !HELP lower hole center at 0 -193.5 0
// 
// 0 BFC CERTIFY CCW
  [0,"BFC","CERTIFY"],
  [0,"BFC","CCW"],
// 
// 0 !CATEGORY Sheet Plastic
// 0 !KEYWORDS Cobra Hood, Pharaoh's Quest, Set 7325
// 
// 0 !HISTORY 2018-12-08 [PTadmin] Official Update 2018-02
// 0 !HISTORY 2019-01-25 [cwdee] Set new category
// 0 !HISTORY 2019-06-28 [PTadmin] Official Update 2019-01
// 
// 
// 0 BFC INVERTNEXT
  [0,"BFC","INVERTNEXT"],
// 1 16 0 0 0 9 0 0 0 -0.5 0 0 0 9 4-4cyli.dat
  [1,16,0,0,0,9,0,0,0,-0.5,0,0,0,9, ldraw_lib__4_4cyli()],
// 0 BFC INVERTNEXT
  [0,"BFC","INVERTNEXT"],
// 1 16 0 0 -193.5 9 0 0 0 -0.5 0 0 0 9 4-4cyli.dat
  [1,16,0,0,-193.5,9,0,0,0,-0.5,0,0,0,9, ldraw_lib__4_4cyli()],
// 1 16 0 0 0 1 0 0 0 -1 0 0 0 1 s\93668s01.dat
  [1,16,0,0,0,1,0,0,0,-1,0,0,0,1, ldraw_lib__s__93668s01()],
// 1 16 0 0 0 -1 0 0 0 -1 0 0 0 1 s\93668s01.dat
  [1,16,0,0,0,-1,0,0,0,-1,0,0,0,1, ldraw_lib__s__93668s01()],
// 1 16 0 0 0 1 0 0 0 1 0 0 0 1 s\93668s02.dat
  [1,16,0,0,0,1,0,0,0,1,0,0,0,1, ldraw_lib__s__93668s02()],
// 1 16 0 0 0 -1 0 0 0 1 0 0 0 1 s\93668s02.dat
  [1,16,0,0,0,-1,0,0,0,1,0,0,0,1, ldraw_lib__s__93668s02()],
// 1 16 0 -0.5 0 1 0 0 0 1 0 0 0 1 s\93668s01.dat
  [1,16,0,-0.5,0,1,0,0,0,1,0,0,0,1, ldraw_lib__s__93668s01()],
// 1 16 0 -0.5 0 -1 0 0 0 1 0 0 0 1 s\93668s01.dat
  [1,16,0,-0.5,0,-1,0,0,0,1,0,0,0,1, ldraw_lib__s__93668s01()],
// 5 24 0 0 19 0 -0.5 19 20 0 17.5 -20 0 17.5
  [5,24,0,0,19,0,-0.5,19,20,0,17.5,-20,0,17.5],
];
module ldraw_lib__93668(step=0, col=false, unit=2/5, alt=false, line=0.2, solid=!$preview)
    makepoly(ldraw_lib__93668(), step=step, col=col, unit=unit, alt=alt, line=line, solid=solid);
ldraw_lib__93668(line=0.2);
